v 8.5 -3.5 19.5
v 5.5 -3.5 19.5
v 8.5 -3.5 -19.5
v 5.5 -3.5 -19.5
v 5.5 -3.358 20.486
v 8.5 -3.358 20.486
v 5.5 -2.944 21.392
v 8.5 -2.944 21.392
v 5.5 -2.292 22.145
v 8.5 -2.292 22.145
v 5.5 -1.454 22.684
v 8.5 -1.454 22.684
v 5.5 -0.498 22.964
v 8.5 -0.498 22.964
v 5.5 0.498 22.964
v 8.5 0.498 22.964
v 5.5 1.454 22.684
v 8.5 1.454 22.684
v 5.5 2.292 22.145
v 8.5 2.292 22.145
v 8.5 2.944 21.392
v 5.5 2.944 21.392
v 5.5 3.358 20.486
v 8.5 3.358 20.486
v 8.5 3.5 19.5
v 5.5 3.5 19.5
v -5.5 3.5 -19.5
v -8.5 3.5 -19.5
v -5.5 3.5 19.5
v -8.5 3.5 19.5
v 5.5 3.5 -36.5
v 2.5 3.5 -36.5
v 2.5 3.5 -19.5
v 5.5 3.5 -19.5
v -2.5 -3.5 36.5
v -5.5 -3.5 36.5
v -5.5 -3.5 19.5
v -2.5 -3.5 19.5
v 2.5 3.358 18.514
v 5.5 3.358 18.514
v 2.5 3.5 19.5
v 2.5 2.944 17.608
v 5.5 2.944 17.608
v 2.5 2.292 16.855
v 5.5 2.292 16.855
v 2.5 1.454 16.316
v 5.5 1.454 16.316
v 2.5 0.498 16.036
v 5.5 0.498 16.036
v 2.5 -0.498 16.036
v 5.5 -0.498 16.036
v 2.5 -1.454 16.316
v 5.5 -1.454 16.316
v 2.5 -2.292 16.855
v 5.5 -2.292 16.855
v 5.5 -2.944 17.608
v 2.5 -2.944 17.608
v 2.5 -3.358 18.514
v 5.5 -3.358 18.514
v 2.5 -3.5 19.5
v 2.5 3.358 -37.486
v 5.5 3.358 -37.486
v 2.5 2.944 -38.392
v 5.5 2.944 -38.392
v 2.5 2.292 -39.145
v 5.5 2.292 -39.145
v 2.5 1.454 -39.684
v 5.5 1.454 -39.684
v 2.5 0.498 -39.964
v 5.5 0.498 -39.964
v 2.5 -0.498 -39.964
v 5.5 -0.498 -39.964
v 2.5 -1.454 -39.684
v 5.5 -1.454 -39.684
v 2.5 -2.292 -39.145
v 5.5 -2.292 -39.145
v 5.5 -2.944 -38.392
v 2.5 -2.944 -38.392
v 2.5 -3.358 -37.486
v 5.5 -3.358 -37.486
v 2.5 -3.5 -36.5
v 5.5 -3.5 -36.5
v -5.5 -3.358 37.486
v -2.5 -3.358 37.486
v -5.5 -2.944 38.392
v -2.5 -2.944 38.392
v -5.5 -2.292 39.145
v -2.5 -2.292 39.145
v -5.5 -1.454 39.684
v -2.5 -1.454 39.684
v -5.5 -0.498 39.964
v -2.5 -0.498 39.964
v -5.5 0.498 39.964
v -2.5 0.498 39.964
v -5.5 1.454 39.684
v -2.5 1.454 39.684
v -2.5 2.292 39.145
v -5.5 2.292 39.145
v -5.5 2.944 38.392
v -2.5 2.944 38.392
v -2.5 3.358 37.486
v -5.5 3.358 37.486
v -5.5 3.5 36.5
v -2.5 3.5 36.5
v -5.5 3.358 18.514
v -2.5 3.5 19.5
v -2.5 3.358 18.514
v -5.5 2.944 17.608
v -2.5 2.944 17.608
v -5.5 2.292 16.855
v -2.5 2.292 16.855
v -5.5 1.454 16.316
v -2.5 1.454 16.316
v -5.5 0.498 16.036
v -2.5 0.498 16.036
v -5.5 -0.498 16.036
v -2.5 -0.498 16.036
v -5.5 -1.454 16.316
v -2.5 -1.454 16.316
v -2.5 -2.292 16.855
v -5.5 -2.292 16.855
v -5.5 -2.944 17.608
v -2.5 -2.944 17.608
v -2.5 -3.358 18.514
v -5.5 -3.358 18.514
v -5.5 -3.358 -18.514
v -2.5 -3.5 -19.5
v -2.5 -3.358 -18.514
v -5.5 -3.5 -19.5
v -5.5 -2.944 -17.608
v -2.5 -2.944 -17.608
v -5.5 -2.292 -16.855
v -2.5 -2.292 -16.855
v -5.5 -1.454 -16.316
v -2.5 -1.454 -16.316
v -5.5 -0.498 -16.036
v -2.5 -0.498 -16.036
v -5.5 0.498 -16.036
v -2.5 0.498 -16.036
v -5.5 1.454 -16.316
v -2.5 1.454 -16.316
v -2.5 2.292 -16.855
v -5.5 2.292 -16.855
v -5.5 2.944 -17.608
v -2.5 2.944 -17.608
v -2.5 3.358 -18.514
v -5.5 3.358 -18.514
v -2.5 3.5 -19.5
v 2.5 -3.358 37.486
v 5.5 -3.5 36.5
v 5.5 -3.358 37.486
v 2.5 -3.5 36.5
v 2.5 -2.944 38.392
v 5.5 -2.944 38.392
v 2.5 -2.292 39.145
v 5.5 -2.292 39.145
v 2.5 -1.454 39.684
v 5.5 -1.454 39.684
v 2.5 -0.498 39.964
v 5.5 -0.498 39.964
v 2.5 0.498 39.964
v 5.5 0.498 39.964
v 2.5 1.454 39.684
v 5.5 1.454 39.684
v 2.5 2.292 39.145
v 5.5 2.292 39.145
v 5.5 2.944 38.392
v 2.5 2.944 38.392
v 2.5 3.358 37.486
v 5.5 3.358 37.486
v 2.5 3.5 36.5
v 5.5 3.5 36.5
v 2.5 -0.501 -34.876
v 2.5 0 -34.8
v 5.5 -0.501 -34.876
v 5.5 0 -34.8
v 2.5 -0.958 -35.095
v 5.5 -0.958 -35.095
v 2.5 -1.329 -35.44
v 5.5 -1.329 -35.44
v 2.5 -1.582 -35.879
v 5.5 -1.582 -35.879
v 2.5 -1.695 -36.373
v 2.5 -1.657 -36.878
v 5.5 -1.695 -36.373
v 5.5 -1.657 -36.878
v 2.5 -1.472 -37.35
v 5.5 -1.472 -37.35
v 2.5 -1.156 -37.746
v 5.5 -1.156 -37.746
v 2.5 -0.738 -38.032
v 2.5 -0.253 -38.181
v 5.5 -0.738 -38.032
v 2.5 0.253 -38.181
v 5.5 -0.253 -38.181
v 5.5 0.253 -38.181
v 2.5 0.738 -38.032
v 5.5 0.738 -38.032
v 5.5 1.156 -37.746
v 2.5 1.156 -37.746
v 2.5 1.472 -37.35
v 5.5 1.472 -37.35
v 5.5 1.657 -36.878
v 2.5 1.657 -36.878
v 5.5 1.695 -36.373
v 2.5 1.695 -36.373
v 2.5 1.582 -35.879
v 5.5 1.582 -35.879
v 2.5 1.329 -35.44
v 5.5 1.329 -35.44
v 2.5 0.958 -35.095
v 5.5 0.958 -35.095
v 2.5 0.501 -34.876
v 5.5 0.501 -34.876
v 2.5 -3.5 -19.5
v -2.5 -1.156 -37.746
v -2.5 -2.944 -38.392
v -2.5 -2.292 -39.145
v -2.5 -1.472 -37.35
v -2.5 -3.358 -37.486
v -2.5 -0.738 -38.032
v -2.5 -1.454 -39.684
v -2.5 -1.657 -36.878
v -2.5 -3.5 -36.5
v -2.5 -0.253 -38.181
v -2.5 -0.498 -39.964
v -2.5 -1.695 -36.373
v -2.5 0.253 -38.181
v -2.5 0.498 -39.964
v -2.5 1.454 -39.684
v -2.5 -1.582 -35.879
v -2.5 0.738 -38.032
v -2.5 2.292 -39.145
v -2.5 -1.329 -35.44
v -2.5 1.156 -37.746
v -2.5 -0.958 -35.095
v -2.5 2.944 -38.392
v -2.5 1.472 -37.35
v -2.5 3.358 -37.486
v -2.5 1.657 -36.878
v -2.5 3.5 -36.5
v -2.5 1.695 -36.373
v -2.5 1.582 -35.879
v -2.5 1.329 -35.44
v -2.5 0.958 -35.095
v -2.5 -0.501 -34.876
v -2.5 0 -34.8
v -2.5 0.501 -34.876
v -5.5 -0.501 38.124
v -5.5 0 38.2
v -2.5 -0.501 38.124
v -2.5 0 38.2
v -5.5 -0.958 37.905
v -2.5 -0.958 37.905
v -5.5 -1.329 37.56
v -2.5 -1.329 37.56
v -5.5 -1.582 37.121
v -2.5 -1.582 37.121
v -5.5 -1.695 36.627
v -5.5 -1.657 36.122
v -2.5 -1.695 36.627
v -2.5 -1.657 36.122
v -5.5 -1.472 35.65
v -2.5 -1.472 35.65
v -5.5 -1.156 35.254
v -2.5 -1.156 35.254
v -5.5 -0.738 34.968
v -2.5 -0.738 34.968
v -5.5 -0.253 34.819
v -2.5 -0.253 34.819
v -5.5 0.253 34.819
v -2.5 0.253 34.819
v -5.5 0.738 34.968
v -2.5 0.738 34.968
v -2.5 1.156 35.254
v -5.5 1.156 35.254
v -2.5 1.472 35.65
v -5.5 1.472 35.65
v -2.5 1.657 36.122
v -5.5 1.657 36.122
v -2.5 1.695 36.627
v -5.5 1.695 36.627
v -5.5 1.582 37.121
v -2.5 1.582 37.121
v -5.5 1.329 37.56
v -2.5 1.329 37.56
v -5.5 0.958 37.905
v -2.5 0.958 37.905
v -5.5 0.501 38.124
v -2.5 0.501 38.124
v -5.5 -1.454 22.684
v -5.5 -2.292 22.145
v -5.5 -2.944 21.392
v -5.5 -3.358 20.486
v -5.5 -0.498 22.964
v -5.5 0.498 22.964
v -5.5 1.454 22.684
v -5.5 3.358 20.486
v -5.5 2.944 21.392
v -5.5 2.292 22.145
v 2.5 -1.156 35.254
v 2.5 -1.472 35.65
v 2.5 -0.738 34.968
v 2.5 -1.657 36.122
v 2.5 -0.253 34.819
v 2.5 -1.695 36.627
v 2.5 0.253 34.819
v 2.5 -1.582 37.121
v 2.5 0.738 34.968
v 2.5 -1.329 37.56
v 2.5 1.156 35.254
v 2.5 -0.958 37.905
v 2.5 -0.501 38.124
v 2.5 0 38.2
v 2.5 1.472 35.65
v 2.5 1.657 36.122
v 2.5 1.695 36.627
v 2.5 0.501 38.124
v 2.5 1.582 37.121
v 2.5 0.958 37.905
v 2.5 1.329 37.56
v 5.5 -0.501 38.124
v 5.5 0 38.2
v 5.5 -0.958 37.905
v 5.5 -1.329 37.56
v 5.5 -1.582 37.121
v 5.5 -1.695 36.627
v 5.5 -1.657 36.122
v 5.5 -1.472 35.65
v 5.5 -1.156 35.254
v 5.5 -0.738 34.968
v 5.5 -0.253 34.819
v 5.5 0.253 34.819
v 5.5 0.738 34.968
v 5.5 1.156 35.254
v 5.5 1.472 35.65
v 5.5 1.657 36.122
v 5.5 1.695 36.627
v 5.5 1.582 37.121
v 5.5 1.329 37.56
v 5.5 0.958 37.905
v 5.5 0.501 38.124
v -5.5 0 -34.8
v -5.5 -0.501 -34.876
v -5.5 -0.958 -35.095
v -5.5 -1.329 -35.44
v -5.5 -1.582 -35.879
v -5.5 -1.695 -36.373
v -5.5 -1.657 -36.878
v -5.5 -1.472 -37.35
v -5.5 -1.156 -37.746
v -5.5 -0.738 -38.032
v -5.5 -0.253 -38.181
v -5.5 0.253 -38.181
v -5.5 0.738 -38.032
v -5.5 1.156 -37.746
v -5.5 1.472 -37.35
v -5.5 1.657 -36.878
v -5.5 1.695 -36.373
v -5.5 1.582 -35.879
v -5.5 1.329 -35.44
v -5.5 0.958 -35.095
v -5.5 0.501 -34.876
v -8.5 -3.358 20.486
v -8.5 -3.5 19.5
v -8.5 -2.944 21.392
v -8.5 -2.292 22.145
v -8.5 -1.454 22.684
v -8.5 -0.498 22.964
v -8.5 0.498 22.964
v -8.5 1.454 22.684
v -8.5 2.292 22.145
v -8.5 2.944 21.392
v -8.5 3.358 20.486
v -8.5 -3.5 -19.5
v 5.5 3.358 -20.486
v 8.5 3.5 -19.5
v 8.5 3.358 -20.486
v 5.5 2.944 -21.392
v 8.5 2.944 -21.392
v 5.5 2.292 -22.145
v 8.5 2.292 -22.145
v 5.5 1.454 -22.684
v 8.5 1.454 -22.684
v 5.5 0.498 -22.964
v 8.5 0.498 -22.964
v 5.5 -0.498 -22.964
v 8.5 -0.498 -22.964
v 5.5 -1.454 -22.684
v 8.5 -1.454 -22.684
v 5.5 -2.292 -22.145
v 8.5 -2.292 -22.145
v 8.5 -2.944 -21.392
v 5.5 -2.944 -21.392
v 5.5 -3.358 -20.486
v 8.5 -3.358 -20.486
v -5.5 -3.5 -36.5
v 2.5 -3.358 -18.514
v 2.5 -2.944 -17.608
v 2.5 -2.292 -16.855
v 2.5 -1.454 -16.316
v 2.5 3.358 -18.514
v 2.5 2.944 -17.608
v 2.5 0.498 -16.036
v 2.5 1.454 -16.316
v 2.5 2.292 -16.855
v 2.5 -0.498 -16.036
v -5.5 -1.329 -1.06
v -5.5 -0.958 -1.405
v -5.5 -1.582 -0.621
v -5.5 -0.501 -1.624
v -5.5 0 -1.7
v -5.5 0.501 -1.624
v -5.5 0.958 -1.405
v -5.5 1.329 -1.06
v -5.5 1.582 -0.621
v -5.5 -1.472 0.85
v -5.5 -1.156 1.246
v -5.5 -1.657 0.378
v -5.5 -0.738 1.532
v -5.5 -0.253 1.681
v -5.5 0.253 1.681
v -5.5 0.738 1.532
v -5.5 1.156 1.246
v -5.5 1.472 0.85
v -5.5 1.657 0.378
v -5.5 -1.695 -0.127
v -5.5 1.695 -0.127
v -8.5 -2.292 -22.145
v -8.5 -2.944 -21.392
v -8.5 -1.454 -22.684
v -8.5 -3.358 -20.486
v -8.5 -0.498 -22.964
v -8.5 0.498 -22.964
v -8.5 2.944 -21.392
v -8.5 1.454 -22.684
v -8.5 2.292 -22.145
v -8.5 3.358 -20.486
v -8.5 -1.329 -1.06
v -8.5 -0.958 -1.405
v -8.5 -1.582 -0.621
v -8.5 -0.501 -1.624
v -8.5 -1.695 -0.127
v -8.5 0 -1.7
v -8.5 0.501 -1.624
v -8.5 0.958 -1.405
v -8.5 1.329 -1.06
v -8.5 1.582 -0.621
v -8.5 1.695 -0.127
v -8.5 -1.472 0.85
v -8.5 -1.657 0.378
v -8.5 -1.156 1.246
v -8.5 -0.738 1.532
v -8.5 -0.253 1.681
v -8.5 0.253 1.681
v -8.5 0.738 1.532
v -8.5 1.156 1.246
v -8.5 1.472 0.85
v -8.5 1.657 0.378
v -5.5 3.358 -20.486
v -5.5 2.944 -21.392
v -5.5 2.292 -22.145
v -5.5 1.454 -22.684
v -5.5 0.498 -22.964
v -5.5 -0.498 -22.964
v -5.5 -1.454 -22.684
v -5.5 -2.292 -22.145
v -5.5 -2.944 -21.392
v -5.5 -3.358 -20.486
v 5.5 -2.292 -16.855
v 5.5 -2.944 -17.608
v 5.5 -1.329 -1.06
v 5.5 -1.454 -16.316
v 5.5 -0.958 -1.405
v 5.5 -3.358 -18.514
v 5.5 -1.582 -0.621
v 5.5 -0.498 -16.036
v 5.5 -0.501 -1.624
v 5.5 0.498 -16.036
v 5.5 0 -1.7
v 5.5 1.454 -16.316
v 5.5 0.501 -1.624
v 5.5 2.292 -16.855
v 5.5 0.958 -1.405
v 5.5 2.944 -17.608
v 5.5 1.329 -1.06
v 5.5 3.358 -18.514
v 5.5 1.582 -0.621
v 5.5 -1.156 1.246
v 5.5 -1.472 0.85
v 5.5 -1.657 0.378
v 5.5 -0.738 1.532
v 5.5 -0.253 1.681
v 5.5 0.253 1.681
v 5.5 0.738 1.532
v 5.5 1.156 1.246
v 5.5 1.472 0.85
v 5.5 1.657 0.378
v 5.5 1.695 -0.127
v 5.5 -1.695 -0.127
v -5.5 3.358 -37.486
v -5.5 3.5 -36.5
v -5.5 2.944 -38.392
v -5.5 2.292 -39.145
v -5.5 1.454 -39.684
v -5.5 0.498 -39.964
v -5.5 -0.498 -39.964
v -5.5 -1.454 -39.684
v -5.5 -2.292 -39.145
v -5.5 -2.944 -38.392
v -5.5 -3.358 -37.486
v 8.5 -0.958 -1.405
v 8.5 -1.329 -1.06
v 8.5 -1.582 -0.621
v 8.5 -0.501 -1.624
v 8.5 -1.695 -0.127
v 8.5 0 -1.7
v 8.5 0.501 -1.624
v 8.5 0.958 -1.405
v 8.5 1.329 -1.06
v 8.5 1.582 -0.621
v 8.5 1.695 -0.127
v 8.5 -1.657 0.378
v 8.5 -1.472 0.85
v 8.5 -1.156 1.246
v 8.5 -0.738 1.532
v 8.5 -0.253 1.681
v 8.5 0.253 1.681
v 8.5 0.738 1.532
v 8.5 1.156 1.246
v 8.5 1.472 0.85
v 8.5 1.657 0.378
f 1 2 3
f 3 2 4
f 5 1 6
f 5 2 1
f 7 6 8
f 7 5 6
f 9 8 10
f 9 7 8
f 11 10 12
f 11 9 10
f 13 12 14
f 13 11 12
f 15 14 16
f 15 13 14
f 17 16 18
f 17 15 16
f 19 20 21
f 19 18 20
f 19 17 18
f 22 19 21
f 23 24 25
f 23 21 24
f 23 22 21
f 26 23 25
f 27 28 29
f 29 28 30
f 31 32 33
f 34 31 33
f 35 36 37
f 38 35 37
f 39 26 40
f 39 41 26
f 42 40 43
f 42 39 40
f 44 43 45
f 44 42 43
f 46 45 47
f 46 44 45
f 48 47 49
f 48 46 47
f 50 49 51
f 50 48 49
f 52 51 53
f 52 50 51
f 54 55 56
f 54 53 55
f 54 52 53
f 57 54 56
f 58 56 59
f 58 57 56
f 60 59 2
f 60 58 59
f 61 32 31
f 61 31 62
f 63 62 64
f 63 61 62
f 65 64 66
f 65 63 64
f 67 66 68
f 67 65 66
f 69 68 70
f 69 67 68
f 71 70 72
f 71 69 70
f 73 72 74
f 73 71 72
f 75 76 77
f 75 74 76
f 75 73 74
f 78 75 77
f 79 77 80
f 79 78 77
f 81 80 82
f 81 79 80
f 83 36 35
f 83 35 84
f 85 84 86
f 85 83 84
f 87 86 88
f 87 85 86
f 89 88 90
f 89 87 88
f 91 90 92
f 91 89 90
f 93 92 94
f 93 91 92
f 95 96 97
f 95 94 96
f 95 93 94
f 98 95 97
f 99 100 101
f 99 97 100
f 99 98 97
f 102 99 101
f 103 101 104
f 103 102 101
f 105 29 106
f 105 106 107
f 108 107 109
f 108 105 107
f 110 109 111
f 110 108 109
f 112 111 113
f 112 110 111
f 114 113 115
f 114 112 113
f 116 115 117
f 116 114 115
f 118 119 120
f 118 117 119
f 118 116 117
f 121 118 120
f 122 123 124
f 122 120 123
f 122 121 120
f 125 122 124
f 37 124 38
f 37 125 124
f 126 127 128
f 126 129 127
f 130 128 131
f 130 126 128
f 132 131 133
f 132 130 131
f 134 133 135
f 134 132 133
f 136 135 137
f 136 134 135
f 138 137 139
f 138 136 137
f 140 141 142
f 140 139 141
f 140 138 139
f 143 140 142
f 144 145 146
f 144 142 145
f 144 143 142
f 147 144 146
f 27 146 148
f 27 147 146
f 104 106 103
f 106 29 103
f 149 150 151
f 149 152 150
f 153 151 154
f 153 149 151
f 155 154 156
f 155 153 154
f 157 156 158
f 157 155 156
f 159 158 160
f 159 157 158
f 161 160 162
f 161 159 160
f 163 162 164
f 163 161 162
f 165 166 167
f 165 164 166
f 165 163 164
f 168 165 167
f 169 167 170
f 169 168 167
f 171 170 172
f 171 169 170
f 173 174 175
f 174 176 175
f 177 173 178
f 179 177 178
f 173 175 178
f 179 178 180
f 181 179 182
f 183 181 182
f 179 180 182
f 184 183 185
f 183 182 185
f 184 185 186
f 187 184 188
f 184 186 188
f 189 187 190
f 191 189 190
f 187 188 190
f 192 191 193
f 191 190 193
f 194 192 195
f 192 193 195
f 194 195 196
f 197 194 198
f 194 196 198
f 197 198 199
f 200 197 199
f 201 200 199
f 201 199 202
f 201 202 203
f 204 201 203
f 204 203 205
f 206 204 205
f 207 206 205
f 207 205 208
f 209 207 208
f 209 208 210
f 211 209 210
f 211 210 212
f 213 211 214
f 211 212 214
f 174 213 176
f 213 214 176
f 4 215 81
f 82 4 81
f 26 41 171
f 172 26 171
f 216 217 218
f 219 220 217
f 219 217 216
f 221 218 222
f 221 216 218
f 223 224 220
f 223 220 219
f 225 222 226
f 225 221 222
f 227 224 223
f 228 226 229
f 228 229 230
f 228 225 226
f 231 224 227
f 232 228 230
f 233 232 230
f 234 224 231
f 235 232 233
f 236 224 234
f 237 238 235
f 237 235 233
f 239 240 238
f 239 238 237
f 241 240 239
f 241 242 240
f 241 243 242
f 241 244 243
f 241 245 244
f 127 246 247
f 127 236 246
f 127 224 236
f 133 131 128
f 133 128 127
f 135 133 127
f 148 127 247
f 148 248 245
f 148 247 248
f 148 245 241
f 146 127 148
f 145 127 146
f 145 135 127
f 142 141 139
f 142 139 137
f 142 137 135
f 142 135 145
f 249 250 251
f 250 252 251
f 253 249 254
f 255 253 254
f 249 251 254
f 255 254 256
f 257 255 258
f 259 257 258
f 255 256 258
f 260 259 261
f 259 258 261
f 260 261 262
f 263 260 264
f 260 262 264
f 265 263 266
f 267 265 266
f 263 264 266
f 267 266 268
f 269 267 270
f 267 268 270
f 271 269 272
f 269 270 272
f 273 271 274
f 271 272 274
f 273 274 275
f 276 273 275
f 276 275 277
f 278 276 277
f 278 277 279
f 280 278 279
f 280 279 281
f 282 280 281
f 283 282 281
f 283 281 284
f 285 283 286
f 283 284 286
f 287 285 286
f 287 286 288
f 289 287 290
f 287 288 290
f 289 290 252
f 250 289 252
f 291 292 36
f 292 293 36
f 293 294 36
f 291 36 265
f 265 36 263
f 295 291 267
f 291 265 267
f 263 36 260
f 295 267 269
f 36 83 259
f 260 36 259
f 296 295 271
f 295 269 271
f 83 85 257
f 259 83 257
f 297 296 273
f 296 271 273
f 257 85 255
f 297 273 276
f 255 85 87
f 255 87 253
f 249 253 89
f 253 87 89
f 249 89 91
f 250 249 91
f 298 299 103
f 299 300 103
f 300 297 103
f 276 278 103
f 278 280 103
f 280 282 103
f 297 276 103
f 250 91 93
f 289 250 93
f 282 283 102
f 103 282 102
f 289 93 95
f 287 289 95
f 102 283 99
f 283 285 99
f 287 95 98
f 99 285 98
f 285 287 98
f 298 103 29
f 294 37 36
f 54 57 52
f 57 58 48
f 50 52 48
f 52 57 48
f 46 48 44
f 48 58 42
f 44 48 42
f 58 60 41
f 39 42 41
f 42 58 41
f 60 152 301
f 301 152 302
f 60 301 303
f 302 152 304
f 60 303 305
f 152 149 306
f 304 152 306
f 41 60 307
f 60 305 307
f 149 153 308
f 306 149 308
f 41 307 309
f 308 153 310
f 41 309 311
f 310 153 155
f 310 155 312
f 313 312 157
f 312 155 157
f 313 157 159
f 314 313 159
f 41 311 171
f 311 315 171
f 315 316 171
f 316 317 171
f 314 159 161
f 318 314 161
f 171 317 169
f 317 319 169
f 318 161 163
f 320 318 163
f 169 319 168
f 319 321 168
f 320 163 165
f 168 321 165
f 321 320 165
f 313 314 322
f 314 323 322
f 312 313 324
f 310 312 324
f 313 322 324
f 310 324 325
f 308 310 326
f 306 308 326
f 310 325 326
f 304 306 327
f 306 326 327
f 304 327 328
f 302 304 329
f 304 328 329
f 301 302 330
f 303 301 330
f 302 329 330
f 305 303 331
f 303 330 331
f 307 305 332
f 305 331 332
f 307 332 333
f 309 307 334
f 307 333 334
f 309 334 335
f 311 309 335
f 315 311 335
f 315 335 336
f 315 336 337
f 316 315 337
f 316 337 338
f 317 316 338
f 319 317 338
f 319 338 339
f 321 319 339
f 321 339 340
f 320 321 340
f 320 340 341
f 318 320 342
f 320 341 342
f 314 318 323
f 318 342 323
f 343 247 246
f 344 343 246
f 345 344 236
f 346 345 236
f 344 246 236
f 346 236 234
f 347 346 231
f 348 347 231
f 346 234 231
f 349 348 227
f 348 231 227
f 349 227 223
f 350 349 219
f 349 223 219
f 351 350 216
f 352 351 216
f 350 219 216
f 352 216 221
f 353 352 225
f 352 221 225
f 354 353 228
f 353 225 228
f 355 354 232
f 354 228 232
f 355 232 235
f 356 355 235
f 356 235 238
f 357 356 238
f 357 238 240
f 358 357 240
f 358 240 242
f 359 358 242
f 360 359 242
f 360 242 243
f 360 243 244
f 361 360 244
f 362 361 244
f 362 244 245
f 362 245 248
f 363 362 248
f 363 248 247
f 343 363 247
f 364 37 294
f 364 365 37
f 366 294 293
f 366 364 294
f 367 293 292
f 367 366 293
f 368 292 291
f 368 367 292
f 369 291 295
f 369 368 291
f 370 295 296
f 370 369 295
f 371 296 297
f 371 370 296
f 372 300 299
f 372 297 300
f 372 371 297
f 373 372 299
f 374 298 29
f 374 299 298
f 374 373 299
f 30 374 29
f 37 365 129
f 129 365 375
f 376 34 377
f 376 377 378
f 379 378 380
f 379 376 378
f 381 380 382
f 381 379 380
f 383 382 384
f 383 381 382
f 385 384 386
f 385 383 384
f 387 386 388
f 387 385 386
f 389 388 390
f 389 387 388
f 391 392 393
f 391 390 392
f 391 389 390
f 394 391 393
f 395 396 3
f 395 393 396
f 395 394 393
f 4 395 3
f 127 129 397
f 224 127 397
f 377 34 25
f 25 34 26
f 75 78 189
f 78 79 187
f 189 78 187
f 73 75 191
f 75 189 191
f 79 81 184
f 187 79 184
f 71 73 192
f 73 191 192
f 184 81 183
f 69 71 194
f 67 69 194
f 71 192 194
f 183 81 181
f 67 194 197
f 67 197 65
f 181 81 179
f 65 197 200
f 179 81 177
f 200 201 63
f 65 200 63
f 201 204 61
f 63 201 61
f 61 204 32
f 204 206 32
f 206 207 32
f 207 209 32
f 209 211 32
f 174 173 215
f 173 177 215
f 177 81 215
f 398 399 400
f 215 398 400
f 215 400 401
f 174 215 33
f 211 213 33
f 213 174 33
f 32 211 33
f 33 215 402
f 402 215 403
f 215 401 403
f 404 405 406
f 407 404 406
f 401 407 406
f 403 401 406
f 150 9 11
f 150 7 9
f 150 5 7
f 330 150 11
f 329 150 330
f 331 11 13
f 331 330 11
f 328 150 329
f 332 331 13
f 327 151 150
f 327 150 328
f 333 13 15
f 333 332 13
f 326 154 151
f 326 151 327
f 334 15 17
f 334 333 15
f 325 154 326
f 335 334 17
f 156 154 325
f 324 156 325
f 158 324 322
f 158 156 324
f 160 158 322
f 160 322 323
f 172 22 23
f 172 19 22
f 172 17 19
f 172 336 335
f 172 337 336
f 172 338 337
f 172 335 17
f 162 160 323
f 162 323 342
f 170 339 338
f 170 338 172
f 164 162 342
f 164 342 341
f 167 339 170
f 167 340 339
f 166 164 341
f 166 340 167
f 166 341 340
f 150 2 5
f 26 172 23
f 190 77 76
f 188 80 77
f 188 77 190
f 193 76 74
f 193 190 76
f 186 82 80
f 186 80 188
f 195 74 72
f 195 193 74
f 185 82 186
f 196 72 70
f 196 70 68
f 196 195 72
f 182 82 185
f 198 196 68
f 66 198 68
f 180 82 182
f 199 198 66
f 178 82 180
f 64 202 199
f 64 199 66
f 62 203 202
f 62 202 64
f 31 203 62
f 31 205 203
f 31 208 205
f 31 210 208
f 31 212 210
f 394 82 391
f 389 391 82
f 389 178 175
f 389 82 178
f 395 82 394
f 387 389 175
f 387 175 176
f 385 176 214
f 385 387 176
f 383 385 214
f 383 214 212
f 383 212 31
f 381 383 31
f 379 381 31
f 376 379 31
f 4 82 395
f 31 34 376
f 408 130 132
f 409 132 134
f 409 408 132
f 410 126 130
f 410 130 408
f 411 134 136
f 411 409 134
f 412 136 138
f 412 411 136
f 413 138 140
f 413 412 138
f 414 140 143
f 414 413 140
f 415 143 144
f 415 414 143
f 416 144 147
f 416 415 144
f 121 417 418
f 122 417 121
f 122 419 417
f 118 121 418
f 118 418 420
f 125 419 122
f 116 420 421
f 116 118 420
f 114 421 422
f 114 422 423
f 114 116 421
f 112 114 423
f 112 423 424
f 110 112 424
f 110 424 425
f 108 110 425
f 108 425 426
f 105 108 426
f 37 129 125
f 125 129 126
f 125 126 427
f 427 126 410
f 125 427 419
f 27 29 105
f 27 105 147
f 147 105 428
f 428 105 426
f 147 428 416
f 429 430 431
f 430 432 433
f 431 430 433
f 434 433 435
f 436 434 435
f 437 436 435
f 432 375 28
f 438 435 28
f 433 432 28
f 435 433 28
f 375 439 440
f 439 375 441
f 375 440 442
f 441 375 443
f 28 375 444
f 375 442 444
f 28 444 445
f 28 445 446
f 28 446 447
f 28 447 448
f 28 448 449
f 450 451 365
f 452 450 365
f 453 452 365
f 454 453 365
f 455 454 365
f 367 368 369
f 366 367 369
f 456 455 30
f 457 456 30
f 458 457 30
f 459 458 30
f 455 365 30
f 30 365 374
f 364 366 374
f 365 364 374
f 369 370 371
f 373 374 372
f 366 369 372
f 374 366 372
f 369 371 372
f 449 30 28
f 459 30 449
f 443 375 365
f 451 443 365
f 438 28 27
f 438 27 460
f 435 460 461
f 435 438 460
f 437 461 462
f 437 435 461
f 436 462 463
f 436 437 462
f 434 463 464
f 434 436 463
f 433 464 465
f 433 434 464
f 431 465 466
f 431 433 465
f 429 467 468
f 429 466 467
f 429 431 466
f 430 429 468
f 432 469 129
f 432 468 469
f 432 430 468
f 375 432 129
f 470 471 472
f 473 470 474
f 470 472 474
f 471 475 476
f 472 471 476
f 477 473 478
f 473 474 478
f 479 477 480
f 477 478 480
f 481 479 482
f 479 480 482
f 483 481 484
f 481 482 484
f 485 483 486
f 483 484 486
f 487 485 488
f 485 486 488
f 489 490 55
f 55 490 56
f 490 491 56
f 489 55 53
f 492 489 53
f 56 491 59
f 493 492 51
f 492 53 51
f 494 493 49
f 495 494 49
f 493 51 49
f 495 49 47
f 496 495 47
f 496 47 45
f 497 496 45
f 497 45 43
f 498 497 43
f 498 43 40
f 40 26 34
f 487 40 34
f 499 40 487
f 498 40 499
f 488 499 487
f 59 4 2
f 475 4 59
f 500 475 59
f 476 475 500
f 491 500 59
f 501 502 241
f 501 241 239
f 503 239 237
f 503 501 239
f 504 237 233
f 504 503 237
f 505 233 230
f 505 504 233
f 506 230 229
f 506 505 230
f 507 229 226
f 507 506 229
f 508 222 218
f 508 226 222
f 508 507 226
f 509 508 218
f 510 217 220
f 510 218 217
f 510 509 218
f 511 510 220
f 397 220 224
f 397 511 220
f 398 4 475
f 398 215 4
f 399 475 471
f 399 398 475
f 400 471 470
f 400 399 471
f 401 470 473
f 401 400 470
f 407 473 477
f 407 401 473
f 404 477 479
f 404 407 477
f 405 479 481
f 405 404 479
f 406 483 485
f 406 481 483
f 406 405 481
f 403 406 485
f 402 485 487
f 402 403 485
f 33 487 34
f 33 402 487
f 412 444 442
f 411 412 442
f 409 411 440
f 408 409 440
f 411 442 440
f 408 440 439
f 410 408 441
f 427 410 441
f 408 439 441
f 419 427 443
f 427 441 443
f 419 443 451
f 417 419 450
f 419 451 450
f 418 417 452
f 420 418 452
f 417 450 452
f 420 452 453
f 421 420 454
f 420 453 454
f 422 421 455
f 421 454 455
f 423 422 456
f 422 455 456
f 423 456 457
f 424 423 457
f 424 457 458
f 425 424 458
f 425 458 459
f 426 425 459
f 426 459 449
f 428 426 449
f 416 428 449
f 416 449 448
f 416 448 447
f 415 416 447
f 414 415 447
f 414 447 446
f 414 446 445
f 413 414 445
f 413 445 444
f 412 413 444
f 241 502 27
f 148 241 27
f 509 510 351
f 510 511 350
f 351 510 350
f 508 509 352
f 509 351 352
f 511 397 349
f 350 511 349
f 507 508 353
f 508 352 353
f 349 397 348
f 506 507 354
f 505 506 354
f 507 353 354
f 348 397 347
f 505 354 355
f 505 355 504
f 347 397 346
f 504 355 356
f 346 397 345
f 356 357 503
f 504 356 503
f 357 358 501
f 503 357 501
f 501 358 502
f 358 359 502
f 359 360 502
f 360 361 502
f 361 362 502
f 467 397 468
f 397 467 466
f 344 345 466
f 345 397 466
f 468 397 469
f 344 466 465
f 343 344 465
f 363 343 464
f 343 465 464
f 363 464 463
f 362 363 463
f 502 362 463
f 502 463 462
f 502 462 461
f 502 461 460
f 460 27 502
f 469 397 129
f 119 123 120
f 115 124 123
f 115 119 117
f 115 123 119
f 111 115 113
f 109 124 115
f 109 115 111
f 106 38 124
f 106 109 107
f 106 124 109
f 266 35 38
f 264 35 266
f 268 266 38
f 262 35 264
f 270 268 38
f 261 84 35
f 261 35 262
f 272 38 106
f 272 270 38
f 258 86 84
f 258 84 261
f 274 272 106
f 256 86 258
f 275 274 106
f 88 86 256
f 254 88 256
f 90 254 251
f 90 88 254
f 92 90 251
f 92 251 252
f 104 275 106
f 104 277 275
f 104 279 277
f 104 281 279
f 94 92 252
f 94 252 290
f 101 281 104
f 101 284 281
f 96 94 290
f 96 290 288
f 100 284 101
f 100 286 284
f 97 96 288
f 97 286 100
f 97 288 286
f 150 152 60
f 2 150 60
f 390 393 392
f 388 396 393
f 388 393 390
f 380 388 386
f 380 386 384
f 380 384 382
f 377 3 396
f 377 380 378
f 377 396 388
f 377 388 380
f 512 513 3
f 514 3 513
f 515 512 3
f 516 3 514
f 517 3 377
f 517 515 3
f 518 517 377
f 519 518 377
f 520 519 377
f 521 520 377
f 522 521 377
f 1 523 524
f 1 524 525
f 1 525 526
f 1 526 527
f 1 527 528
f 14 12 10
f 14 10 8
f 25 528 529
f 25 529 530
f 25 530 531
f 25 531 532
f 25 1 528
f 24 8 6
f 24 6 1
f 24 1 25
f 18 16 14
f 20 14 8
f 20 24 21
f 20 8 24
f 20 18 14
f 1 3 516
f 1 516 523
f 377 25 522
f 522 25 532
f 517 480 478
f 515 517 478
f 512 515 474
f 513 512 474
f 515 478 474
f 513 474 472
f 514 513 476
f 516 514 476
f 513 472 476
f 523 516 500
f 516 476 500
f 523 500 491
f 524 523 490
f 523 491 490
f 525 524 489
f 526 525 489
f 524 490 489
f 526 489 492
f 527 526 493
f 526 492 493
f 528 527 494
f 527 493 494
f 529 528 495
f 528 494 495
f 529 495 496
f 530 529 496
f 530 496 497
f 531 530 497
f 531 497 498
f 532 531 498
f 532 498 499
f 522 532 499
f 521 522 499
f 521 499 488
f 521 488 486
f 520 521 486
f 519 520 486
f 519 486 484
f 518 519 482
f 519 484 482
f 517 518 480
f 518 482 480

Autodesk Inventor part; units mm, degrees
ref_plane "YZ Plane" through (0, 0, 0) normal (1, 0, 0) x (0, 1, 0)
ref_plane "XZ Plane" through (0, 0, 0) normal (0, 1, 0) x (-1, 0, 0)
ref_plane "XY Plane" through (0, 0, 0) normal (0, 0, 1) x (1, 0, 0)
sketch "Sketch1" plane through (0, 0, 0) normal (1, 0, 0) x (0, 1, 0)
  line L0 (0, -36.5) -> (0, 36.5) construction
  line L1 (3.5, -36.5) -> (3.5, 36.5)
  line L2 (-3.5, 36.5) -> (-3.5, -36.5)
  arc A0 (-3.5, -36.5) -> (3.5, -36.5) centre (0, -36.5) ccw
  arc A1 (3.5, 36.5) -> (-3.5, 36.5) centre (0, 36.5) ccw
  circle A2 centre (0, 36.5) radius 1.5
  circle A3 centre (0, -36.5) radius 1.5
  line L3 (0, -19.5) -> (0, 19.5) construction
  line L4 (3.5, -19.5) -> (3.5, 19.5)
  line L5 (-3.5, 19.5) -> (-3.5, -19.5)
  arc A4 (-3.5, -19.5) -> (3.5, -19.5) centre (0, -19.5) ccw
  arc A5 (3.5, 19.5) -> (-3.5, 19.5) centre (0, 19.5) ccw
  line L6 (0, -36.5) -> (0, -19.5) construction
  line L7 (-3.5, -36.5) -> (-3.5, -19.5)
  line L8 (3.5, -19.5) -> (3.5, -36.5)
  arc A6 (-3.5, -36.5) -> (3.5, -36.5) centre (0, -36.5) ccw
  arc A7 (3.5, -19.5) -> (-3.5, -19.5) centre (0, -19.5) ccw
  line L9 (3.5, 0) -> (-3.5, 0) construction
  line L10 (0, 36.5) -> (0, 19.5) construction
  line L11 (-3.5, 36.5) -> (-3.5, 19.5)
  line L12 (3.5, 19.5) -> (3.5, 36.5)
  arc A8 (3.5, 36.5) -> (-3.5, 36.5) centre (0, 36.5) ccw
  arc A9 (-3.5, 19.5) -> (3.5, 19.5) centre (0, 19.5) ccw
  circle A10 centre (0, 0) radius 1.5
  point P0 (0, 0)
  point P1 (0, -40)
  point P2 (0, 40)
  point P3 (3.5, 19.5)
  point P4 (-3.5, 19.5)
  point P5 (3.5, -19.5)
  point P6 (0, -28)
  point P7 (0, 28)
  point P8 (3.5, 19.5)
  point P9 (-3.5, 19.5)
  point P10 (-3.5, -19.5)
  point P11 (3.5, -19.5)
  point P12 (0, 0)
  point P13 (0, 0)
  dimension "d18" = 80
  dimension "d20" = 7
  dimension "d32" = 39
  dimension "d44" = 3
  dimension "d46" = 0
extrude "Extrusión3" add sketch "Sketch1" along normal mid plane 17 contours A7 L2 A9 L1 | A4 A7 | A9 A5 | A10
extrude "Extrusión4" cut sketch "Sketch1" along normal mid plane 11 contours A7 L2 A9 L1 | A4 A7 | A9 A5 | A10
extrude "Extrusión5" add sketch "Sketch1" along normal mid plane 11 contours A0 L2 A4 L1 | A4 A7 | A5 L2 A1 L1 | A9 A5 | A2 | A3
extrude "Extrusión6" cut sketch "Sketch1" along normal mid plane 5 contours A0 L2 A4 L1 | A4 A7 | A5 L2 A1 L1 | A9 A5 | A2 | A3
sketch "Boceto2" plane through (-5.5, 0, 0) normal (-1, 0, 0) x (0, 0, 1)
  point P0 (-36.5, 0)
  point P1 (36.5, 0)
hole "Agujero1" at (-5.5, 0, -36.5) at (-5.5, 0, 36.5) direction (1, 0, 0) diameter 3.4 end through all clearance for "Tornillo de cabeza plana avellanada ISO 2009/7046" size "M3" standard "ISO"
sketch "Boceto3" plane through (8.5, 0, 0) normal (1, 0, 0) x (0, 0, -1)
  point P0 (0, 0)
  point P1 (0, 0)
hole "Agujero2" at (8.5, 0, 0) direction (-1, 0, 0) diameter 3.4 end through all clearance for "Tornillo de cabeza plana avellanada ISO 2009/7046" size "M3" standard "ISO"
properties part number "Corredera I" material "Aluminum 7075"
